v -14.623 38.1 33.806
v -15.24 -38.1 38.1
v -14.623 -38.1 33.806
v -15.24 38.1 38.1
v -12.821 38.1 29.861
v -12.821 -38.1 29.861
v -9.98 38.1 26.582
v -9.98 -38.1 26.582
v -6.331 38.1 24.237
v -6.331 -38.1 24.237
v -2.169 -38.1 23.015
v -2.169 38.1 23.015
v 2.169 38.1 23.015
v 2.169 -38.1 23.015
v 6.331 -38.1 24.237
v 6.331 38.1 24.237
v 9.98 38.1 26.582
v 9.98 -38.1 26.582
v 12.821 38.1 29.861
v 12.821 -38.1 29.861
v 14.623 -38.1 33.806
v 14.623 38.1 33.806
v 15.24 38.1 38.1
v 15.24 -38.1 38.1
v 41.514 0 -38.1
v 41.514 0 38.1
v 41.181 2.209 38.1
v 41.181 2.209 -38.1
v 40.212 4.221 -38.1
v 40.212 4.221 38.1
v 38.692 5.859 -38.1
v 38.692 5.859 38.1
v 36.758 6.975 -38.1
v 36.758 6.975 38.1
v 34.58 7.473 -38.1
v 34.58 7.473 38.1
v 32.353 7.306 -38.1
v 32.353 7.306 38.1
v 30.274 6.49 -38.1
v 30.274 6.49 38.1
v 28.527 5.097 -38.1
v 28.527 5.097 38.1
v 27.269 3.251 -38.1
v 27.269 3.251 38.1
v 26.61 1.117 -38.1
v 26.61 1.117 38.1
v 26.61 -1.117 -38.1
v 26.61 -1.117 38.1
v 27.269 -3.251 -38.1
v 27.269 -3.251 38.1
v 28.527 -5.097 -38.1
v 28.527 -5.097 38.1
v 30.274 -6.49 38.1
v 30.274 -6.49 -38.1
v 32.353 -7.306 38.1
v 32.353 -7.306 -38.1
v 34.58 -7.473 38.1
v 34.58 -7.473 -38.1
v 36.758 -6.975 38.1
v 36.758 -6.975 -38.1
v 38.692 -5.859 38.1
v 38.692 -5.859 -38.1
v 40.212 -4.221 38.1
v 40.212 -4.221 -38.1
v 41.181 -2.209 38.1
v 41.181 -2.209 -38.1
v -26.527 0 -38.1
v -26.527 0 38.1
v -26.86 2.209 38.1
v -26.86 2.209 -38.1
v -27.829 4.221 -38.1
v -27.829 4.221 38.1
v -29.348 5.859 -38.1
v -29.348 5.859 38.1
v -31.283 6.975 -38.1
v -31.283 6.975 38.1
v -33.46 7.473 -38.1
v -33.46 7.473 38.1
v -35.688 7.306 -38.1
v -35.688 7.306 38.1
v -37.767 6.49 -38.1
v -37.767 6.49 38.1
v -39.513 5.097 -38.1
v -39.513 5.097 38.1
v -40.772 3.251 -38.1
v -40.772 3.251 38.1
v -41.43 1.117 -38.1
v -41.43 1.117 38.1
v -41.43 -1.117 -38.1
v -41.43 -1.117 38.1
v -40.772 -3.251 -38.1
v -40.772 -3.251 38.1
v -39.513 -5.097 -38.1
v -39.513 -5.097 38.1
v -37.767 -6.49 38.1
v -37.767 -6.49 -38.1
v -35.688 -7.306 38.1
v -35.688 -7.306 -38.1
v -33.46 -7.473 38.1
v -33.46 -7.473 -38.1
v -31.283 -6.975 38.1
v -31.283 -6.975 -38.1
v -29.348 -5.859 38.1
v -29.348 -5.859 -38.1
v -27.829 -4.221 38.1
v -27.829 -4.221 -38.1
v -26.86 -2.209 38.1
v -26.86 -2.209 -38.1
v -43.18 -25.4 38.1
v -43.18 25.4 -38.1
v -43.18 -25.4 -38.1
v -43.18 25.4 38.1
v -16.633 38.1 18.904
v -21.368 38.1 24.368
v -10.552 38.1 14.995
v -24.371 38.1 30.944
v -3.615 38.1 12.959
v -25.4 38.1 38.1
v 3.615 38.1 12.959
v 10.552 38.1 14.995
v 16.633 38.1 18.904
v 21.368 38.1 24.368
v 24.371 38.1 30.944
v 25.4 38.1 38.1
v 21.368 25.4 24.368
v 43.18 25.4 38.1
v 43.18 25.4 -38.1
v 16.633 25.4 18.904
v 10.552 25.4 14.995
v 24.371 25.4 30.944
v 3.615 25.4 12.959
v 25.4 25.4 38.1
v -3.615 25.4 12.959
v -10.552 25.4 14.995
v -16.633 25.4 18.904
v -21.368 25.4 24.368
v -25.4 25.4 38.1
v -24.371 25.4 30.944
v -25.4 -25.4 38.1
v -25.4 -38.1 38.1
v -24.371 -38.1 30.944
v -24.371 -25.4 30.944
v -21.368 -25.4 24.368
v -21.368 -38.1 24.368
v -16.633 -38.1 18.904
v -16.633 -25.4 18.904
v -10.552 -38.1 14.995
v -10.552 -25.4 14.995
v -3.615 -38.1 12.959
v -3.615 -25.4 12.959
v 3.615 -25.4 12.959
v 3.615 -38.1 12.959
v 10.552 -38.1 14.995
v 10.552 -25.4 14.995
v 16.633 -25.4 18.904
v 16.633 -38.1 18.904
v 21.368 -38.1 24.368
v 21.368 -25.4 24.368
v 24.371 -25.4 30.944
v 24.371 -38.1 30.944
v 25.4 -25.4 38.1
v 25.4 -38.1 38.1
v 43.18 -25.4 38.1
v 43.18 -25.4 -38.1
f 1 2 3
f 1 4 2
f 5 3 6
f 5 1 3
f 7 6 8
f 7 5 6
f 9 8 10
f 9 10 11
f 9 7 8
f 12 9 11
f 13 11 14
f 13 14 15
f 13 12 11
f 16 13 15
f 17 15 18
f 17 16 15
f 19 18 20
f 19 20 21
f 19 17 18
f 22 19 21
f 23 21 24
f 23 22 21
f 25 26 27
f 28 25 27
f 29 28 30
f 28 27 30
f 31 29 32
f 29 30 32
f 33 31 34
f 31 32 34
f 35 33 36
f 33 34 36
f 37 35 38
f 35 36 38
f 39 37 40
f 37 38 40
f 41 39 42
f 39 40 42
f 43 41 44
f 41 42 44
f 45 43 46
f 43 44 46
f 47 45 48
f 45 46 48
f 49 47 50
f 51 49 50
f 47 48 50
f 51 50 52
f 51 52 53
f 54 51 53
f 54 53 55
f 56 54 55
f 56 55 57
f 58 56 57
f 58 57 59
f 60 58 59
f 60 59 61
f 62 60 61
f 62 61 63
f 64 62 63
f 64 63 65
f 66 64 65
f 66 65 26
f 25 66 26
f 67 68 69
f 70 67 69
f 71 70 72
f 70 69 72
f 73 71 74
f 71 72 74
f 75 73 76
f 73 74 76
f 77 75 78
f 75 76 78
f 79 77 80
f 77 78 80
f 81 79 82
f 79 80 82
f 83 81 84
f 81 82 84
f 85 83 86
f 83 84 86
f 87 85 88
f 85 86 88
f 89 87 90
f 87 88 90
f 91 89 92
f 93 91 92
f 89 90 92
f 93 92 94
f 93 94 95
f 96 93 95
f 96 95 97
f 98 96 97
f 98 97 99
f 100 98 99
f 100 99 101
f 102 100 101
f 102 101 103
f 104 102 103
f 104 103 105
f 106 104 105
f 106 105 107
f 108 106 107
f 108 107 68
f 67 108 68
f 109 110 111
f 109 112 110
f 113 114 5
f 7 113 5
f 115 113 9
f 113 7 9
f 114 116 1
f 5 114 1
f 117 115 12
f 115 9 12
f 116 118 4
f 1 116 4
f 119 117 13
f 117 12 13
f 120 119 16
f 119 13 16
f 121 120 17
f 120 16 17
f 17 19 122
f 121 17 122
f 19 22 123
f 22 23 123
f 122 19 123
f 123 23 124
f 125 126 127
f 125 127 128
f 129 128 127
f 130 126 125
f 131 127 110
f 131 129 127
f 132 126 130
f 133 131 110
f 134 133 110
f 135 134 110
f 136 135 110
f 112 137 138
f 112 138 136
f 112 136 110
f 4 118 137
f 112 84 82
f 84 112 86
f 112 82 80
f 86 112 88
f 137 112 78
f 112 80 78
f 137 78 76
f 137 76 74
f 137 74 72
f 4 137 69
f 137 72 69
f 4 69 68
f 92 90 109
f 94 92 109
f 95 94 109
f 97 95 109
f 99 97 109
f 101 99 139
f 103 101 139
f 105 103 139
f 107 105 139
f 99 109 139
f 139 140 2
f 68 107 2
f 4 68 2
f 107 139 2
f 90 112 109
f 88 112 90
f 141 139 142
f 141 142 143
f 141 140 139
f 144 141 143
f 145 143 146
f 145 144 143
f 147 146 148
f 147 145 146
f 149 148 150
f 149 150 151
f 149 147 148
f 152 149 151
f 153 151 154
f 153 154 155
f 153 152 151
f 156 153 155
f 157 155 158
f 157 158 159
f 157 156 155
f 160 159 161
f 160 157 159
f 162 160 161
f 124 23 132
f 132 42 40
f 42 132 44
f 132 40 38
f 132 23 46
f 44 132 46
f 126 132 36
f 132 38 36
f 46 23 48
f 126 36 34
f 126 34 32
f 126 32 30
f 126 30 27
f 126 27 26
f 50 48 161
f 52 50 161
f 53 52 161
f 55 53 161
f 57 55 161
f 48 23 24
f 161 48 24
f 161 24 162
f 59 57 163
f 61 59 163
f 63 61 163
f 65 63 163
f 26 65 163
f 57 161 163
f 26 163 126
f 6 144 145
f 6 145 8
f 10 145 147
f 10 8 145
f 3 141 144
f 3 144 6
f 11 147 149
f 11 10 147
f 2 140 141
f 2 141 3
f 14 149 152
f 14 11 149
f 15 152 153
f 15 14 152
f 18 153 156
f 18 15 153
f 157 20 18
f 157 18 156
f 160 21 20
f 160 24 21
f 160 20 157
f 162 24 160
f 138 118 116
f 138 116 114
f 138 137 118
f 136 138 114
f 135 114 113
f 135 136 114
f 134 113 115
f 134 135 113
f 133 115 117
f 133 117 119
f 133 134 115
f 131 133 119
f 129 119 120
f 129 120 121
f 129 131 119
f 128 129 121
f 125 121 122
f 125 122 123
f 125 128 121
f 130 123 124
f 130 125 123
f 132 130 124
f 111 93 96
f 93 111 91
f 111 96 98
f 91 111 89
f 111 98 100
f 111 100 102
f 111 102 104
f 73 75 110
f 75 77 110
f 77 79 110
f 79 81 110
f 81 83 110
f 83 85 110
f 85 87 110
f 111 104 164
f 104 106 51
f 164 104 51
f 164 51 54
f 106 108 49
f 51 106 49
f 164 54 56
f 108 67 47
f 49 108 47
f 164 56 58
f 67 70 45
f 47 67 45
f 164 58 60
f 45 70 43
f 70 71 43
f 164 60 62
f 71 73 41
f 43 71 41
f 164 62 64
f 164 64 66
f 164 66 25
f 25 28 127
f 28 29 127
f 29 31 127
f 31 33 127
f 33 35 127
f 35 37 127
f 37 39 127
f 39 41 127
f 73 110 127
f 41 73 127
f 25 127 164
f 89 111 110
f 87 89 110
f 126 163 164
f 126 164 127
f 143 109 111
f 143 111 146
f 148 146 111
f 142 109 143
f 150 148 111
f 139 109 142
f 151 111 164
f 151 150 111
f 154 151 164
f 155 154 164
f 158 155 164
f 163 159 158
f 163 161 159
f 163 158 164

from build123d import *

# Parameters (mm, degrees)
F1_DEPTH = 38.1
F2_R     = 25.4
F2_R_2   = 15.24
F3_DEPTH = 38.1
F4_R     = 15.24
F5_DEPTH = 127
F7_DEPTH = 63.5
F8_R     = 7.4934659192
F9_DEPTH = 76.201


with BuildPart() as f1:
    # F0 (on Top) → F1 (new body, symmetric)
    with BuildSketch(Plane.XY):
        Polygon((-43.18, 0), (-43.18, -25.4), (-20.32, -25.4), (20.32, -25.4), (43.18, -25.4), (43.18, 0), (43.18, 25.4), (20.32, 25.4), (-20.32, 25.4), (-43.18, 25.4), align=None)
    extrude(amount=F1_DEPTH, both=True)

    # F2 (on Front) → F3 (join, symmetric)
    with BuildSketch(Plane.XZ):
        with Locations((0, 38.1)):
            Circle(F2_R)
        with Locations((0, 38.1)):
            Circle(F2_R_2, mode=Mode.SUBTRACT)
    extrude(amount=F3_DEPTH, both=True)

    # F4 (on face) → F5 (cut)
    with BuildSketch(Plane.XZ.offset(38.1)):
        with Locations((0, 38.1)):
            Circle(F4_R)
    extrude(amount=-F5_DEPTH, mode=Mode.SUBTRACT)

    # F6 (on Front) → F7 (cut, symmetric)
    with BuildSketch(Plane.XZ):
        Polygon((-46.0331514478, 71.8028391659), (-43.5670912266, 38.1), (43.5670949519, 38.1), (43.5670949519, 71.8028391659), align=None)
    extrude(amount=F7_DEPTH, both=True, mode=Mode.SUBTRACT)

    # F8 (on face) → F9 (cut, through all)
    with BuildSketch(Plane.XY.offset(38.1)):
        with Locations((-34.0202599764, 0)):
            Circle(F8_R)
        with Locations((34.0202599764, 0)):
            Circle(F8_R)
    extrude(amount=-F9_DEPTH, mode=Mode.SUBTRACT)


solid = f1.part
